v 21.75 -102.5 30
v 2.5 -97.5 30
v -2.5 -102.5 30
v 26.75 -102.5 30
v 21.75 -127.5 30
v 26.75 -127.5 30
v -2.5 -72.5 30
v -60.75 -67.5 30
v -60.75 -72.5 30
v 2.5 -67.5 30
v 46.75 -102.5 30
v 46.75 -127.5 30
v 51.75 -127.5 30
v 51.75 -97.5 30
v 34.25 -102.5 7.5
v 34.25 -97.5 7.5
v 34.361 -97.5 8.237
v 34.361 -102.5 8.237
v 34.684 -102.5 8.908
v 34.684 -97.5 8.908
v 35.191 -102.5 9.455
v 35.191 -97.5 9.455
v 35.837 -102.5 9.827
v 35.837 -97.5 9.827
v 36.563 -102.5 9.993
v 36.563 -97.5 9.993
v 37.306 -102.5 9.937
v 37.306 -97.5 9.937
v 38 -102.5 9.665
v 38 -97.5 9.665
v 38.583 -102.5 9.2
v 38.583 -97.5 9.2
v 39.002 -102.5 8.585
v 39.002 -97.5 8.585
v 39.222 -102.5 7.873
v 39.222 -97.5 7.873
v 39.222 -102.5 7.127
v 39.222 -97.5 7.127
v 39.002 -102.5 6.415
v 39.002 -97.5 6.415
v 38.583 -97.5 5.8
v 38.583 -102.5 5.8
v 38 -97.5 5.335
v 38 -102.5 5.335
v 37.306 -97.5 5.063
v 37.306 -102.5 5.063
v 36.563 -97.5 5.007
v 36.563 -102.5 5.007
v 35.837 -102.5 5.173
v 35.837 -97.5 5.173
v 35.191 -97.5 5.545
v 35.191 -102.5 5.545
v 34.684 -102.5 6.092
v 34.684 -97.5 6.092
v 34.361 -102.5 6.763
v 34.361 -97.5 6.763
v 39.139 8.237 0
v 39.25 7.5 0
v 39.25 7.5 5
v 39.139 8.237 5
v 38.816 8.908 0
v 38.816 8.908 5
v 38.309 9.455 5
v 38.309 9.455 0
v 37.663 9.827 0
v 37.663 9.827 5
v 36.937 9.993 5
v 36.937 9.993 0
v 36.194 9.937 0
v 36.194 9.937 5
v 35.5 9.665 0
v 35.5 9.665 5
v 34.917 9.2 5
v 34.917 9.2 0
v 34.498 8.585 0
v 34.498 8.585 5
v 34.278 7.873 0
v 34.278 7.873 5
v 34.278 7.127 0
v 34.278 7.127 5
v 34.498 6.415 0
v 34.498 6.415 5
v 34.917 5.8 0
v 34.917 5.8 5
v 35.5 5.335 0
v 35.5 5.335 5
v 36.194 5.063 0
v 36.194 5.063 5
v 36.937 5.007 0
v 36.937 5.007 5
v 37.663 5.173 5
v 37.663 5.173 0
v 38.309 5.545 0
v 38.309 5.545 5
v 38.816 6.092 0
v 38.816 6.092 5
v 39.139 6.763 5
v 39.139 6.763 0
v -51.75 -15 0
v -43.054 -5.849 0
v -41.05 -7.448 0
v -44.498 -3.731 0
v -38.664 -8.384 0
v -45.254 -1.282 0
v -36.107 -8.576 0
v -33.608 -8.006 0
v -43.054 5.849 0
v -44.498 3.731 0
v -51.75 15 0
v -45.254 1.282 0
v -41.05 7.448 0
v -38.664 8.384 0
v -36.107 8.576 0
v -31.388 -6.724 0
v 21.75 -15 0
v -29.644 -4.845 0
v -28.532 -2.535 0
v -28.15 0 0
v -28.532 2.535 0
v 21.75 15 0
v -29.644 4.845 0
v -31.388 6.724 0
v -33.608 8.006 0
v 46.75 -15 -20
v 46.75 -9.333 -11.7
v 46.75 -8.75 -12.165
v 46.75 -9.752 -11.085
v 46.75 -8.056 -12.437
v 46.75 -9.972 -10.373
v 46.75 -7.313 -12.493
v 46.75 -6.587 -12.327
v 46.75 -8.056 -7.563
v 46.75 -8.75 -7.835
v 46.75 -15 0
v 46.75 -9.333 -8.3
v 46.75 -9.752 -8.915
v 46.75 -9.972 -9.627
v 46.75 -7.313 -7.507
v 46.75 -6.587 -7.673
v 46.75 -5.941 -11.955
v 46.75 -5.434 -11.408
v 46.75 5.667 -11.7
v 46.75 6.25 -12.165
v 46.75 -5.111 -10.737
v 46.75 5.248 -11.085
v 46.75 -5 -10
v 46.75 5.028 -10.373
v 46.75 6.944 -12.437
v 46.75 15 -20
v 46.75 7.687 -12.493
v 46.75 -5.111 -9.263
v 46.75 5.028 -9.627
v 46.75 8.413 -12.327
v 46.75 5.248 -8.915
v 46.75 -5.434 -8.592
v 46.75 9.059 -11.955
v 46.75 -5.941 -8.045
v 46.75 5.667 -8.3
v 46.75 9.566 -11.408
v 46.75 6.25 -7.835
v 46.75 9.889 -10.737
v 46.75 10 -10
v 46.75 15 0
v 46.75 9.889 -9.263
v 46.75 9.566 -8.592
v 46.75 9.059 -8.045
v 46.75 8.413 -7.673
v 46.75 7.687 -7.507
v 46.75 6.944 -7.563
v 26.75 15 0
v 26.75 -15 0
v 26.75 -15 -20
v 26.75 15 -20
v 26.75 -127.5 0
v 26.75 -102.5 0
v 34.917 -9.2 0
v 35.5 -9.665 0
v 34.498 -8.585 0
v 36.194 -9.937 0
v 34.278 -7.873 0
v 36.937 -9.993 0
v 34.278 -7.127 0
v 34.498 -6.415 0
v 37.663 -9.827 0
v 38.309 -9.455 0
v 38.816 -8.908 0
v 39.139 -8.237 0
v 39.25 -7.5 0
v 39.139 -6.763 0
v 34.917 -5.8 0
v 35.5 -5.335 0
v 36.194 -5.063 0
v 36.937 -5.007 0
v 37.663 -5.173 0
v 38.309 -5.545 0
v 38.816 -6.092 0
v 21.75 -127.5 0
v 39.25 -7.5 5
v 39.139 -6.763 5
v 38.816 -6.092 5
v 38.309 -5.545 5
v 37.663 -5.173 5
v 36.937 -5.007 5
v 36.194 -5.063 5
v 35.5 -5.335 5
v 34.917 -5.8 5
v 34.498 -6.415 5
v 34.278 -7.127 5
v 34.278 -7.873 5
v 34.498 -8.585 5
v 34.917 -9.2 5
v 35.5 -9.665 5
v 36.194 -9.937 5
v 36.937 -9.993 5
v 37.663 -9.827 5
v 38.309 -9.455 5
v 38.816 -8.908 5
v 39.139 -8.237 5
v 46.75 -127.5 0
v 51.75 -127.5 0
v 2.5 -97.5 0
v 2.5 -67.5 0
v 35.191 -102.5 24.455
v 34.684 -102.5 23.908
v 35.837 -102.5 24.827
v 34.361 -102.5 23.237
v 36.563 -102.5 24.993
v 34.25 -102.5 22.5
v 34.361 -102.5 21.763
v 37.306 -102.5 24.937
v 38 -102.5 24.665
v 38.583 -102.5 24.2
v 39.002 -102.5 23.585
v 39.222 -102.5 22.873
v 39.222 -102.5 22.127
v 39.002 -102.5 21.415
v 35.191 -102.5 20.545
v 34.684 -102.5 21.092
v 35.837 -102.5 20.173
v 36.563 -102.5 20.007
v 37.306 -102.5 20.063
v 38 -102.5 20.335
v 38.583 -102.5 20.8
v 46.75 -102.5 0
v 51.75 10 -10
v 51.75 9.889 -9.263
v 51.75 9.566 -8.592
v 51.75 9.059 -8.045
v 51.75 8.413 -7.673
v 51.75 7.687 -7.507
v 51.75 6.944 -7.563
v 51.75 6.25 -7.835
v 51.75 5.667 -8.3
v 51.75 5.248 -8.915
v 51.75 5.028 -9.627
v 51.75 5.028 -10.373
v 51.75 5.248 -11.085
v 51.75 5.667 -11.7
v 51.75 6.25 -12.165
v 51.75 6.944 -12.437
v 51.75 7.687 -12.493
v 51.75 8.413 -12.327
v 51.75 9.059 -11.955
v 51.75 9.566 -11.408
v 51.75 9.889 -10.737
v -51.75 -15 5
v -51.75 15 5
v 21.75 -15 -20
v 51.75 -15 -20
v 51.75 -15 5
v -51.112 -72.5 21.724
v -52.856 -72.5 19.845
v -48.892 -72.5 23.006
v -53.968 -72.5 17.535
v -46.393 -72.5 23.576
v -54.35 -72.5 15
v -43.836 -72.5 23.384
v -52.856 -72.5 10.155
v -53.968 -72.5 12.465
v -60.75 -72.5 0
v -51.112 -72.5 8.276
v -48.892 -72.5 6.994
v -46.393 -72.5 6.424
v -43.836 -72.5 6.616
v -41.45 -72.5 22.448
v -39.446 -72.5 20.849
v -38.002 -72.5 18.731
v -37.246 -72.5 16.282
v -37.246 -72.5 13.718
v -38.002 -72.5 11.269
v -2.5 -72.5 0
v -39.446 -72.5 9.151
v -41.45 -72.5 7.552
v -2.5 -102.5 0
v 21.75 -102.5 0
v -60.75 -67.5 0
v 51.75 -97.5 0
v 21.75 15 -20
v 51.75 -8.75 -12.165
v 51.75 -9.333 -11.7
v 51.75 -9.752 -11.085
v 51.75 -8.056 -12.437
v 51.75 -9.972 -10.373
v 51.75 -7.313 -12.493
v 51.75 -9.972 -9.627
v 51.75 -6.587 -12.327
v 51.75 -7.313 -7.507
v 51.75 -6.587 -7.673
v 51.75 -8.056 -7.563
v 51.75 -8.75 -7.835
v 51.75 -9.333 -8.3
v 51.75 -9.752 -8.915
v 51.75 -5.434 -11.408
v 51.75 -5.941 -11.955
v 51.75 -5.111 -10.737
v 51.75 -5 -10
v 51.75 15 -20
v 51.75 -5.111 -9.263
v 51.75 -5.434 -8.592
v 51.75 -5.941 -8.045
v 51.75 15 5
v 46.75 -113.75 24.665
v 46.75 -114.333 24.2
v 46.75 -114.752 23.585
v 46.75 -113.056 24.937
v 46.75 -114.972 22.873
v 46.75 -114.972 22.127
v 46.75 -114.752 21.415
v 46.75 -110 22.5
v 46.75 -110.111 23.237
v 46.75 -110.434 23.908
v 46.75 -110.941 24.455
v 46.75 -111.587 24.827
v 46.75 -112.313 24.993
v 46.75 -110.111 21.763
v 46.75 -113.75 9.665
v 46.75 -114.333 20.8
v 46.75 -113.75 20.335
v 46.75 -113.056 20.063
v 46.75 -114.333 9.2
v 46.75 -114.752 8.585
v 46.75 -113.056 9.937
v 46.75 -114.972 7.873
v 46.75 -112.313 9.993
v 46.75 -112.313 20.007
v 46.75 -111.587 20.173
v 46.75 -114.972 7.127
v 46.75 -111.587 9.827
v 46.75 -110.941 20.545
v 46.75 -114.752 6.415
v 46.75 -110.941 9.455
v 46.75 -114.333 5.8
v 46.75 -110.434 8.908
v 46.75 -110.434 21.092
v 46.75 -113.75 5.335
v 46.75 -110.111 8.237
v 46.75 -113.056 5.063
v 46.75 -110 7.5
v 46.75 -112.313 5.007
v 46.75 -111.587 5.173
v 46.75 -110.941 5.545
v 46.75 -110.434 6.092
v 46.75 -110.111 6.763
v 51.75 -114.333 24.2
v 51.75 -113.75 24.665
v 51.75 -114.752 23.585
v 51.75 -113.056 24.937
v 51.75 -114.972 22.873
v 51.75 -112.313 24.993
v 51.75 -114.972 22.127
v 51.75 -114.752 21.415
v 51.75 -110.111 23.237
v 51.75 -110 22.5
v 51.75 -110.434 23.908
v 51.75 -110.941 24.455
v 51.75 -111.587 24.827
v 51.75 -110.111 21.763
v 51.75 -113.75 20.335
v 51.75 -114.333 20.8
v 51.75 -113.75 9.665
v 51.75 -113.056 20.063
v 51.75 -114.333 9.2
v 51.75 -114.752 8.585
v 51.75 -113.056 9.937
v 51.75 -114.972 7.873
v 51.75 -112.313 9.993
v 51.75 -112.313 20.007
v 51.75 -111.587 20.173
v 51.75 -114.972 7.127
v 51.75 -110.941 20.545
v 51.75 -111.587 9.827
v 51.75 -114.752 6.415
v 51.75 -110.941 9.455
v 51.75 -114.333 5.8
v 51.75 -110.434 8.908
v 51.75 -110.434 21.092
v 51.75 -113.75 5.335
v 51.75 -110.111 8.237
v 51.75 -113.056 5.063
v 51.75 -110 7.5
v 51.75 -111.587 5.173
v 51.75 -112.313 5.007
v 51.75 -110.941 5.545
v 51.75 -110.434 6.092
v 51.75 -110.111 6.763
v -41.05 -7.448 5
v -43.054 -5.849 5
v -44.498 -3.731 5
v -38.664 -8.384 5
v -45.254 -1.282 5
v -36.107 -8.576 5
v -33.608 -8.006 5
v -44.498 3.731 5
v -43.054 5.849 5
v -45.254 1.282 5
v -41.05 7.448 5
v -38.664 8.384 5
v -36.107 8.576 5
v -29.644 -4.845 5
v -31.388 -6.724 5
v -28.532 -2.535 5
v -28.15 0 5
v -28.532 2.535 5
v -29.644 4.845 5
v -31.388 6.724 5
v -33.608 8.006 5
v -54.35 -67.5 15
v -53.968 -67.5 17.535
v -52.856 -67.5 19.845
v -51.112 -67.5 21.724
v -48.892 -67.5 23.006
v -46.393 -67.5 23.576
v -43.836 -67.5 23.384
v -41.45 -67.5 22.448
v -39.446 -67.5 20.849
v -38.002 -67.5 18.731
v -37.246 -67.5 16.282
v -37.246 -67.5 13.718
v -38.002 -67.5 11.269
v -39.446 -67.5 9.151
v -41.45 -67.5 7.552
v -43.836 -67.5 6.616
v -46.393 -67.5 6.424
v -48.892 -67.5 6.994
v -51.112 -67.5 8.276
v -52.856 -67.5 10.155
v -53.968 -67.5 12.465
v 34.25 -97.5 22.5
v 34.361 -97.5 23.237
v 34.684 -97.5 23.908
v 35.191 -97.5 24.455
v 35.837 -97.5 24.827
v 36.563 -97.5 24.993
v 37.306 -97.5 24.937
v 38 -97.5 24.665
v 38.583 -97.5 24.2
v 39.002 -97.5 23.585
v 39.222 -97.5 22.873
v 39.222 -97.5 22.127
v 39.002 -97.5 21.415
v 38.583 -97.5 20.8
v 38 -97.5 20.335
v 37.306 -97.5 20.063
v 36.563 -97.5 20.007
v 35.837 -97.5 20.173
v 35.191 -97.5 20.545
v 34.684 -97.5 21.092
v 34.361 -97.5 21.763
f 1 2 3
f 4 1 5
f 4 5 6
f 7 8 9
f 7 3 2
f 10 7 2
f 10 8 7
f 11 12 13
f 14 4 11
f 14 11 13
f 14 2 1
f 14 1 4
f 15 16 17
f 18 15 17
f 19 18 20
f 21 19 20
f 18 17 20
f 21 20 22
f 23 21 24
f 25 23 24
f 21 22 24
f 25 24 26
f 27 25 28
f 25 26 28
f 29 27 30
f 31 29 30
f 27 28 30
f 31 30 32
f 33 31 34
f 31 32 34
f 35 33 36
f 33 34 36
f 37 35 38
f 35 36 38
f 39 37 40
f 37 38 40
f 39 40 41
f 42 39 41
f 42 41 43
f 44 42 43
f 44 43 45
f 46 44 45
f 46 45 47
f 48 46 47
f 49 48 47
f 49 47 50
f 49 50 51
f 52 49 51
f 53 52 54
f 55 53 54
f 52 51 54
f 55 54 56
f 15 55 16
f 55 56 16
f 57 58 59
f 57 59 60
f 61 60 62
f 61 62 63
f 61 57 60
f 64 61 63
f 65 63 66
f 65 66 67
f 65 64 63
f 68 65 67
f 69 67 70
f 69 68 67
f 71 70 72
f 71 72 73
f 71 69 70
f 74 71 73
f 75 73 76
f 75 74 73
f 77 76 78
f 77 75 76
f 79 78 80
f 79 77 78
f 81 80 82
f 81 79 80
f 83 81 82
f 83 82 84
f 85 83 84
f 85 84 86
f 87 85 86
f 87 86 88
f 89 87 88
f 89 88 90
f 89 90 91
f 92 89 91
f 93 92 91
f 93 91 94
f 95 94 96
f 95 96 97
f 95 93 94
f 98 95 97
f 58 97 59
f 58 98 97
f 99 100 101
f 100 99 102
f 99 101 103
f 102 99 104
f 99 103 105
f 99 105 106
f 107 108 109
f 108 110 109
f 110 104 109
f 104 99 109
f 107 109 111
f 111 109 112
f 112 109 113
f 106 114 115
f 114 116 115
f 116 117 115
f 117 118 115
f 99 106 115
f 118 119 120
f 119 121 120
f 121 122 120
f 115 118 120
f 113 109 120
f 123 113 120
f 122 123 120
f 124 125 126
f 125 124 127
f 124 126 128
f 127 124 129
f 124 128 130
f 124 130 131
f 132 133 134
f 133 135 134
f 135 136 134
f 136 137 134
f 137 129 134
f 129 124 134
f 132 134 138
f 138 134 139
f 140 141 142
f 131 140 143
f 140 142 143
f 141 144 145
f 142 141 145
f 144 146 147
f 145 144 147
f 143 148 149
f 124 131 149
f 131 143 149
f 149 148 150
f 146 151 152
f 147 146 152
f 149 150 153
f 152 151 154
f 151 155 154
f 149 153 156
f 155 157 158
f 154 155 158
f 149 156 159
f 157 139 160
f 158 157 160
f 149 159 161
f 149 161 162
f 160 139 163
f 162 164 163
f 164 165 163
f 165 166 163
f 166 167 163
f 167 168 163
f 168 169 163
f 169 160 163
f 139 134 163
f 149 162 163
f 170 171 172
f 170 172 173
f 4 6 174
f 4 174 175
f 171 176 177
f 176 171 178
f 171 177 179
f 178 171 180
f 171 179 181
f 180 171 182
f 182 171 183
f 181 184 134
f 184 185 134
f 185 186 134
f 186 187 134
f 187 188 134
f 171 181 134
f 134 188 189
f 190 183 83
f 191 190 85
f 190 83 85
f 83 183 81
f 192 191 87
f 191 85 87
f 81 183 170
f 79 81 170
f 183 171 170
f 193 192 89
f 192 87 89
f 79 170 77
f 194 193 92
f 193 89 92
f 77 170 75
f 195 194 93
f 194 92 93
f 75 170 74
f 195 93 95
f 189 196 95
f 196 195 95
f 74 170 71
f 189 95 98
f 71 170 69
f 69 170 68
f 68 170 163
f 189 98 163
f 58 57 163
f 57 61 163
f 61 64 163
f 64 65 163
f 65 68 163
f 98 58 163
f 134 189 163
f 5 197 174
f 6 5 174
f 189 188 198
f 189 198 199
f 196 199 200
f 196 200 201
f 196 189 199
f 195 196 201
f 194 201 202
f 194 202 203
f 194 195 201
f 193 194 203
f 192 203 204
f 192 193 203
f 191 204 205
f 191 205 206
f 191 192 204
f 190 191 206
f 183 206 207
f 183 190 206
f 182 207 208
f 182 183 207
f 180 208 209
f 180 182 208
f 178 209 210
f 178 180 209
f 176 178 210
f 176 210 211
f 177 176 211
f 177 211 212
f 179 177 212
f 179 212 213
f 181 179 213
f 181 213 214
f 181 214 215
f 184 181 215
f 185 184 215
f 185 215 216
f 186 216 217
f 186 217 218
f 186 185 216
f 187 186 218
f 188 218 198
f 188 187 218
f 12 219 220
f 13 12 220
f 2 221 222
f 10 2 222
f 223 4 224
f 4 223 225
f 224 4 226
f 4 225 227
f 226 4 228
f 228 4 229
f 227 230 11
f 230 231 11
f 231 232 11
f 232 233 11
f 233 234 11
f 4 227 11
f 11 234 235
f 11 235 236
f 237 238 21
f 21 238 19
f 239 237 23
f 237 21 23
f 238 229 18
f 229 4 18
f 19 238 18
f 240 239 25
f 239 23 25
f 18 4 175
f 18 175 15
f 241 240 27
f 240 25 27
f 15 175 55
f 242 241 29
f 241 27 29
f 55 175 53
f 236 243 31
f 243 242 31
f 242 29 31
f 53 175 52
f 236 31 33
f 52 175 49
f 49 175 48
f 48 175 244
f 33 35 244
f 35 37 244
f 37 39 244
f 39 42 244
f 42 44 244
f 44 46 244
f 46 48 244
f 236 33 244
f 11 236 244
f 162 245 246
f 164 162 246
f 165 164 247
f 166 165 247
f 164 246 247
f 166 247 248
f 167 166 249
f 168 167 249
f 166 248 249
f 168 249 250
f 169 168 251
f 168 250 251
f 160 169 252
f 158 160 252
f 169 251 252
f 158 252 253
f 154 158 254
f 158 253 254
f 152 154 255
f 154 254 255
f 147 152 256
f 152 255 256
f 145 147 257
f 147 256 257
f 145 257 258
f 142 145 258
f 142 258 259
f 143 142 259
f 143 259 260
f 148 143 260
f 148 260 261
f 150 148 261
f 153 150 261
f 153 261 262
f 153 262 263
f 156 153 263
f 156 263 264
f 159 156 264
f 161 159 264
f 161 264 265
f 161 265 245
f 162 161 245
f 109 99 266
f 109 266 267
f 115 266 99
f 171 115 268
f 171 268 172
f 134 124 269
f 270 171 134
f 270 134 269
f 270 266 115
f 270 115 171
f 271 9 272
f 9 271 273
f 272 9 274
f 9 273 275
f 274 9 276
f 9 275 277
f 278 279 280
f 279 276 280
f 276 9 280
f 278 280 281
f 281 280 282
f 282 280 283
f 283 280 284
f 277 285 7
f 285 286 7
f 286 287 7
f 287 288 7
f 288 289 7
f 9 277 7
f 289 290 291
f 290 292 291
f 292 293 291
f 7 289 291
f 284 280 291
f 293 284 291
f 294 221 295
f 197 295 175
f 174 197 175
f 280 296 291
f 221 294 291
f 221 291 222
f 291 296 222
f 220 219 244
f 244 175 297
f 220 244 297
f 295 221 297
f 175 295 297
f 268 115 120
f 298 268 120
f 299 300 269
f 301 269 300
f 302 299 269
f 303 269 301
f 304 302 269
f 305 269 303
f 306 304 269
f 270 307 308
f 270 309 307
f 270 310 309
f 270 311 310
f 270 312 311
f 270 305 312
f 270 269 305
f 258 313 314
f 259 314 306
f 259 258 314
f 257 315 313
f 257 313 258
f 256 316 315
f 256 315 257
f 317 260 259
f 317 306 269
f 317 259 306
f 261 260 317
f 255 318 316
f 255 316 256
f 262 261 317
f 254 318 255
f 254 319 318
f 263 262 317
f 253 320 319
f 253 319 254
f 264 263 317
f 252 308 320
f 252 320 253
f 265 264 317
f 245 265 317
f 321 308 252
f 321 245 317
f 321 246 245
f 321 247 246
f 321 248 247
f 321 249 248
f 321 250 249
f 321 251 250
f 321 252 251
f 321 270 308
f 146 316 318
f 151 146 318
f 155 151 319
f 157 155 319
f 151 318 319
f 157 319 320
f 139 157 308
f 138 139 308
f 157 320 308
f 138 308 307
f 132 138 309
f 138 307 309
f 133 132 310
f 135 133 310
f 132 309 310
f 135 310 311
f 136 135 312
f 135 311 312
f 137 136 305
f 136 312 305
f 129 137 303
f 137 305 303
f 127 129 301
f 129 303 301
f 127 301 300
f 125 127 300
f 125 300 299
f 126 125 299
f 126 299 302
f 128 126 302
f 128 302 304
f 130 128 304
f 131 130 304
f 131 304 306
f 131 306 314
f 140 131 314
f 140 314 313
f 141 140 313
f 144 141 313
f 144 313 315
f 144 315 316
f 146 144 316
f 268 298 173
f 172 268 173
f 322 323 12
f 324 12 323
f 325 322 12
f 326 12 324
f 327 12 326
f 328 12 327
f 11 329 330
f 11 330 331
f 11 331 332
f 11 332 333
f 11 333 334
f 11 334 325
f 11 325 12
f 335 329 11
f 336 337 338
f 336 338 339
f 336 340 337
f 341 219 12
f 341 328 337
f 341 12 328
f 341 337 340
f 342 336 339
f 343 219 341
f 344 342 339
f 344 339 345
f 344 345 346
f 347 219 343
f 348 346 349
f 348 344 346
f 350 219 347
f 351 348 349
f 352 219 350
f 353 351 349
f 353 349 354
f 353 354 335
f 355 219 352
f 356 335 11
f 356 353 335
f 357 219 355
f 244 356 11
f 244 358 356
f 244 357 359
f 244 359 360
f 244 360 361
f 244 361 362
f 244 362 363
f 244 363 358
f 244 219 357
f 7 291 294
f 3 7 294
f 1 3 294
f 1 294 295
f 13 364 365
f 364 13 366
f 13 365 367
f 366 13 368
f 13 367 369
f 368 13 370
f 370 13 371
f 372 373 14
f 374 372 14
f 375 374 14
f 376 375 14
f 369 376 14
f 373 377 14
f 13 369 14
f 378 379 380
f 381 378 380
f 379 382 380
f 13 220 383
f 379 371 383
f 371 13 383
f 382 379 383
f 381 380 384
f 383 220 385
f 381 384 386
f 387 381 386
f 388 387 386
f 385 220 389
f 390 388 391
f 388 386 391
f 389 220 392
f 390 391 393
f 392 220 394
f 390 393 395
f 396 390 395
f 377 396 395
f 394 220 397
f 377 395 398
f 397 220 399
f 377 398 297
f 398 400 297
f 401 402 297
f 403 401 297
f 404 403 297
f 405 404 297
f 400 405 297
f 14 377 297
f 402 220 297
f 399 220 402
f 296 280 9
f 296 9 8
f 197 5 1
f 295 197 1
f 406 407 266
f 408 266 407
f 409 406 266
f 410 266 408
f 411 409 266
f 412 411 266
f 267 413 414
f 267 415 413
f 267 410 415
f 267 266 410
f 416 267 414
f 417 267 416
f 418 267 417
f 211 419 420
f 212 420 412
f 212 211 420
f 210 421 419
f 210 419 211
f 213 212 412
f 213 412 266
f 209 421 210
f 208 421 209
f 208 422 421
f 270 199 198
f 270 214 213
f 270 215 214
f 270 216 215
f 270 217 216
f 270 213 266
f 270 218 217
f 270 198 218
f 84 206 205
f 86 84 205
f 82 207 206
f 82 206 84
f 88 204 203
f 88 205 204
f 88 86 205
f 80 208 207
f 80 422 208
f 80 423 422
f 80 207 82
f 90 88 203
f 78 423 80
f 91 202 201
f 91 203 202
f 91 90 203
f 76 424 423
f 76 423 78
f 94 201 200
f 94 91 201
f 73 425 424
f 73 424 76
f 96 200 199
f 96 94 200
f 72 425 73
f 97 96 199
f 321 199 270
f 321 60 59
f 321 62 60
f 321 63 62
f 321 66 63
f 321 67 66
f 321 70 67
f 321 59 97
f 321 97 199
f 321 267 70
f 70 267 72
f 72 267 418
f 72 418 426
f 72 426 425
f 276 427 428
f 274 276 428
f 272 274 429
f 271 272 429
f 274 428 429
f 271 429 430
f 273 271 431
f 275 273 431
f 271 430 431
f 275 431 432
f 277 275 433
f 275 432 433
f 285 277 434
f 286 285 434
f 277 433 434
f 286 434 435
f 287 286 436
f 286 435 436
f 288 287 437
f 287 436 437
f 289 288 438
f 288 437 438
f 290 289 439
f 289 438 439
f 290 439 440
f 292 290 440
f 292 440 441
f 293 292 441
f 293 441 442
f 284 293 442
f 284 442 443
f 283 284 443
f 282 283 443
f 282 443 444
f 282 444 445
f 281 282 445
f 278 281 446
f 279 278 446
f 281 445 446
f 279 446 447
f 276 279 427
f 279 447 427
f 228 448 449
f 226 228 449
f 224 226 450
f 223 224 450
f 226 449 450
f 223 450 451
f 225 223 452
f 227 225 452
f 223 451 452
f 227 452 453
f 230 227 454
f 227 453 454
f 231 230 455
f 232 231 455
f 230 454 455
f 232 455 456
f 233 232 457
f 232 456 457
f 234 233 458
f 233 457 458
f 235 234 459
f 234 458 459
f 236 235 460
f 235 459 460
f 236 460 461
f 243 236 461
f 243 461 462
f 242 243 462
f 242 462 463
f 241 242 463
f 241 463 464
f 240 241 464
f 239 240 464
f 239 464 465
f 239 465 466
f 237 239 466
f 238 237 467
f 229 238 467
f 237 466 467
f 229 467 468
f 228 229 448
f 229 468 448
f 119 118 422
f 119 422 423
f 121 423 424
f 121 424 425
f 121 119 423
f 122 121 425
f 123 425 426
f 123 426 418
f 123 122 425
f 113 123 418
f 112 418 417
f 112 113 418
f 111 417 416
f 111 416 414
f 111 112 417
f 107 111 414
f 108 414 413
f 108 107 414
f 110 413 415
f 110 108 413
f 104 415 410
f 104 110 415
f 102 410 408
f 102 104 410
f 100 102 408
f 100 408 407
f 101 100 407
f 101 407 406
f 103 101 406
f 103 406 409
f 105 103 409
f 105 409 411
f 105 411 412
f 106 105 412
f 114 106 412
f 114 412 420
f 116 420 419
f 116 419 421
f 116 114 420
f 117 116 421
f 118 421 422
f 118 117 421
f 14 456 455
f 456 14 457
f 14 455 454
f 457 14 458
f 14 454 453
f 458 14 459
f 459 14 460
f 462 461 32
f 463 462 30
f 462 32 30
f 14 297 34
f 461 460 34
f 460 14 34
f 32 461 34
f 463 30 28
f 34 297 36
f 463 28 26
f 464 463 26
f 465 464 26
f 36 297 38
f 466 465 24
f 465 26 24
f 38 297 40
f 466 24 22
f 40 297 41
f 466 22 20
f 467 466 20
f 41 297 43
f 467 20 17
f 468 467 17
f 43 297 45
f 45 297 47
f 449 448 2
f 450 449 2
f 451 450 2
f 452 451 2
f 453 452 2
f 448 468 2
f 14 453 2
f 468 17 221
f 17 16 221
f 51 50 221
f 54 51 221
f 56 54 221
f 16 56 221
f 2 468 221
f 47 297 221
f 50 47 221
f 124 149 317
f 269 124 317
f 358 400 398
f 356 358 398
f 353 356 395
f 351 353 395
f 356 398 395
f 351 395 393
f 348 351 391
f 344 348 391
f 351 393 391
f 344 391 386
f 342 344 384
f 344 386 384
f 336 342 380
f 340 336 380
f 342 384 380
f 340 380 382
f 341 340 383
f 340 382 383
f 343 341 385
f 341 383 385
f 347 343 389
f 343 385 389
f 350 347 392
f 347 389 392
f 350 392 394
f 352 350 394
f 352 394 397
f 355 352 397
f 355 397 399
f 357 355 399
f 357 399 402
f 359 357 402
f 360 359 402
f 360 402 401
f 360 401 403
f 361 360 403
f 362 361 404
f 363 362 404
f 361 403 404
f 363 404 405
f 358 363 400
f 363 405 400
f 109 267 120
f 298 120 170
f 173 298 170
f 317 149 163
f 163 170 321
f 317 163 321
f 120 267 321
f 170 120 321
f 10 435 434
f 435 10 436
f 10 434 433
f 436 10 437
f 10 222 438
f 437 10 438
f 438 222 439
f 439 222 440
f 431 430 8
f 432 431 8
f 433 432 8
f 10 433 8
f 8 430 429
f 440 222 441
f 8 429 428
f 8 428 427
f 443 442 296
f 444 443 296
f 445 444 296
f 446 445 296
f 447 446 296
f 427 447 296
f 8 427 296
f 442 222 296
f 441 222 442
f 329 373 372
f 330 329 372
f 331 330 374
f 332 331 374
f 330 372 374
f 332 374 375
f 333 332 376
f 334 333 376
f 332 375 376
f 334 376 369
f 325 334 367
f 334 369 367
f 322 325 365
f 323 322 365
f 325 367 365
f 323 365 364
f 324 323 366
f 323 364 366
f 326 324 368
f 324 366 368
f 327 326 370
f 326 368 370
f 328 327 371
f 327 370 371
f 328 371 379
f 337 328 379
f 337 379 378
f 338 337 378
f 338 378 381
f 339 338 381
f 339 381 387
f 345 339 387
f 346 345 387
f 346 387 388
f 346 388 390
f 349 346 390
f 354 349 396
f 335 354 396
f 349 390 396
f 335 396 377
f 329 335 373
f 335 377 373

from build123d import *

# Parameters (mm, degrees)
F0_W      = 5
F0_H      = 30
F0_H_2    = 25
F0_W_2    = 73.5
F0_R      = 8.6
F0_W_3    = 20
F0_R_2    = 2.5
F1_DEPTH  = 5
F2_DEPTH  = 20
F3_R      = 2.5
F4_DEPTH  = 10
F0_W_4    = 9
F0_H_3    = 5
F5_DEPTH  = 30
F6_R      = 8.6
F7_DEPTH  = 5
F8_R      = 2.5
F9_DEPTH  = 5
F10_R     = 2.5
F11_DEPTH = 5


with BuildPart() as f1:
    # F0 (on Top) → F1 (new body)
    with BuildSketch(Plane.XY):
        with Locations((49.25, 0)):
            Rectangle(F0_W, F0_H)
        Polygon((-2.5, -97.5), (2.5, -97.5), (2.5, -67.5), (-51.75, -67.5), (-51.75, -72.5), (-2.5, -72.5), align=None)
        with Locations((49.25, -115)):
            Rectangle(F0_W, F0_H_2)
        with Locations((24.25, -115)):
            Rectangle(F0_W, F0_H_2)
        with Locations((24.25, 0)):
            Rectangle(F0_W, F0_H)
        with Locations((-15, 0)):
            Rectangle(F0_W_2, F0_H)
        with Locations((-36.75, 0)):
            Circle(F0_R, mode=Mode.SUBTRACT)
        with Locations((36.75, 0)):
            Rectangle(F0_W_3, F0_H)
        with Locations((36.75, -7.5)):
            Circle(F0_R_2, mode=Mode.SUBTRACT)
        with Locations((36.75, 7.5)):
            Circle(F0_R_2, mode=Mode.SUBTRACT)
        Polygon((51.75, -102.5), (51.75, -97.5), (2.5, -97.5), (-2.5, -97.5), (-2.5, -102.5), (21.75, -102.5), (26.75, -102.5), (46.75, -102.5), align=None)
    extrude(amount=F1_DEPTH)

    # F0 (on Top) → F2 (join)
    with BuildSketch(Plane.XY):
        with Locations((24.25, 0)):
            Rectangle(F0_W, F0_H)
        with Locations((49.25, 0)):
            Rectangle(F0_W, F0_H)
    extrude(amount=-F2_DEPTH)

    # F3 (on face) → F4 (cut)
    with BuildSketch(Plane.YZ.offset(51.75)):
        with Locations((-7.5, -10)):
            Circle(F3_R)
        with Locations((7.5, -10)):
            Circle(F3_R)
    extrude(amount=-F4_DEPTH, mode=Mode.SUBTRACT)

    # F0 (on Top) → F5 (join)
    with BuildSketch(Plane.XY):
        Polygon((-2.5, -97.5), (2.5, -97.5), (2.5, -67.5), (-51.75, -67.5), (-51.75, -72.5), (-2.5, -72.5), align=None)
        Polygon((51.75, -102.5), (51.75, -97.5), (2.5, -97.5), (-2.5, -97.5), (-2.5, -102.5), (21.75, -102.5), (26.75, -102.5), (46.75, -102.5), align=None)
        with Locations((24.25, -115)):
            Rectangle(F0_W, F0_H_2)
        with Locations((49.25, -115)):
            Rectangle(F0_W, F0_H_2)
        with Locations((-56.25, -70)):
            Rectangle(F0_W_4, F0_H_3)
    extrude(amount=F5_DEPTH)

    # F6 (on face) → F7 (cut)
    with BuildSketch(Plane(origin=(0, -67.5, 0), x_dir=(-1, 0, 0), z_dir=(0, 1, 0))):
        with Locations((45.75, 15)):
            Circle(F6_R)
    extrude(amount=-F7_DEPTH, mode=Mode.SUBTRACT)

    # F8 (on face) → F9 (cut)
    with BuildSketch(Plane(origin=(0, -97.5, 0), x_dir=(-1, 0, 0), z_dir=(0, 1, 0))):
        with Locations((-36.75, 7.5)):
            Circle(F8_R)
        with Locations((-36.75, 22.5)):
            Circle(F8_R)
    extrude(amount=-F9_DEPTH, mode=Mode.SUBTRACT)

    # F10 (on face) → F11 (cut)
    with BuildSketch(Plane.YZ.offset(51.75)):
        with Locations((-112.5, 22.5)):
            Circle(F10_R)
        with Locations((-112.5, 7.5)):
            Circle(F10_R)
    extrude(amount=-F11_DEPTH, mode=Mode.SUBTRACT)


solid = f1.part
